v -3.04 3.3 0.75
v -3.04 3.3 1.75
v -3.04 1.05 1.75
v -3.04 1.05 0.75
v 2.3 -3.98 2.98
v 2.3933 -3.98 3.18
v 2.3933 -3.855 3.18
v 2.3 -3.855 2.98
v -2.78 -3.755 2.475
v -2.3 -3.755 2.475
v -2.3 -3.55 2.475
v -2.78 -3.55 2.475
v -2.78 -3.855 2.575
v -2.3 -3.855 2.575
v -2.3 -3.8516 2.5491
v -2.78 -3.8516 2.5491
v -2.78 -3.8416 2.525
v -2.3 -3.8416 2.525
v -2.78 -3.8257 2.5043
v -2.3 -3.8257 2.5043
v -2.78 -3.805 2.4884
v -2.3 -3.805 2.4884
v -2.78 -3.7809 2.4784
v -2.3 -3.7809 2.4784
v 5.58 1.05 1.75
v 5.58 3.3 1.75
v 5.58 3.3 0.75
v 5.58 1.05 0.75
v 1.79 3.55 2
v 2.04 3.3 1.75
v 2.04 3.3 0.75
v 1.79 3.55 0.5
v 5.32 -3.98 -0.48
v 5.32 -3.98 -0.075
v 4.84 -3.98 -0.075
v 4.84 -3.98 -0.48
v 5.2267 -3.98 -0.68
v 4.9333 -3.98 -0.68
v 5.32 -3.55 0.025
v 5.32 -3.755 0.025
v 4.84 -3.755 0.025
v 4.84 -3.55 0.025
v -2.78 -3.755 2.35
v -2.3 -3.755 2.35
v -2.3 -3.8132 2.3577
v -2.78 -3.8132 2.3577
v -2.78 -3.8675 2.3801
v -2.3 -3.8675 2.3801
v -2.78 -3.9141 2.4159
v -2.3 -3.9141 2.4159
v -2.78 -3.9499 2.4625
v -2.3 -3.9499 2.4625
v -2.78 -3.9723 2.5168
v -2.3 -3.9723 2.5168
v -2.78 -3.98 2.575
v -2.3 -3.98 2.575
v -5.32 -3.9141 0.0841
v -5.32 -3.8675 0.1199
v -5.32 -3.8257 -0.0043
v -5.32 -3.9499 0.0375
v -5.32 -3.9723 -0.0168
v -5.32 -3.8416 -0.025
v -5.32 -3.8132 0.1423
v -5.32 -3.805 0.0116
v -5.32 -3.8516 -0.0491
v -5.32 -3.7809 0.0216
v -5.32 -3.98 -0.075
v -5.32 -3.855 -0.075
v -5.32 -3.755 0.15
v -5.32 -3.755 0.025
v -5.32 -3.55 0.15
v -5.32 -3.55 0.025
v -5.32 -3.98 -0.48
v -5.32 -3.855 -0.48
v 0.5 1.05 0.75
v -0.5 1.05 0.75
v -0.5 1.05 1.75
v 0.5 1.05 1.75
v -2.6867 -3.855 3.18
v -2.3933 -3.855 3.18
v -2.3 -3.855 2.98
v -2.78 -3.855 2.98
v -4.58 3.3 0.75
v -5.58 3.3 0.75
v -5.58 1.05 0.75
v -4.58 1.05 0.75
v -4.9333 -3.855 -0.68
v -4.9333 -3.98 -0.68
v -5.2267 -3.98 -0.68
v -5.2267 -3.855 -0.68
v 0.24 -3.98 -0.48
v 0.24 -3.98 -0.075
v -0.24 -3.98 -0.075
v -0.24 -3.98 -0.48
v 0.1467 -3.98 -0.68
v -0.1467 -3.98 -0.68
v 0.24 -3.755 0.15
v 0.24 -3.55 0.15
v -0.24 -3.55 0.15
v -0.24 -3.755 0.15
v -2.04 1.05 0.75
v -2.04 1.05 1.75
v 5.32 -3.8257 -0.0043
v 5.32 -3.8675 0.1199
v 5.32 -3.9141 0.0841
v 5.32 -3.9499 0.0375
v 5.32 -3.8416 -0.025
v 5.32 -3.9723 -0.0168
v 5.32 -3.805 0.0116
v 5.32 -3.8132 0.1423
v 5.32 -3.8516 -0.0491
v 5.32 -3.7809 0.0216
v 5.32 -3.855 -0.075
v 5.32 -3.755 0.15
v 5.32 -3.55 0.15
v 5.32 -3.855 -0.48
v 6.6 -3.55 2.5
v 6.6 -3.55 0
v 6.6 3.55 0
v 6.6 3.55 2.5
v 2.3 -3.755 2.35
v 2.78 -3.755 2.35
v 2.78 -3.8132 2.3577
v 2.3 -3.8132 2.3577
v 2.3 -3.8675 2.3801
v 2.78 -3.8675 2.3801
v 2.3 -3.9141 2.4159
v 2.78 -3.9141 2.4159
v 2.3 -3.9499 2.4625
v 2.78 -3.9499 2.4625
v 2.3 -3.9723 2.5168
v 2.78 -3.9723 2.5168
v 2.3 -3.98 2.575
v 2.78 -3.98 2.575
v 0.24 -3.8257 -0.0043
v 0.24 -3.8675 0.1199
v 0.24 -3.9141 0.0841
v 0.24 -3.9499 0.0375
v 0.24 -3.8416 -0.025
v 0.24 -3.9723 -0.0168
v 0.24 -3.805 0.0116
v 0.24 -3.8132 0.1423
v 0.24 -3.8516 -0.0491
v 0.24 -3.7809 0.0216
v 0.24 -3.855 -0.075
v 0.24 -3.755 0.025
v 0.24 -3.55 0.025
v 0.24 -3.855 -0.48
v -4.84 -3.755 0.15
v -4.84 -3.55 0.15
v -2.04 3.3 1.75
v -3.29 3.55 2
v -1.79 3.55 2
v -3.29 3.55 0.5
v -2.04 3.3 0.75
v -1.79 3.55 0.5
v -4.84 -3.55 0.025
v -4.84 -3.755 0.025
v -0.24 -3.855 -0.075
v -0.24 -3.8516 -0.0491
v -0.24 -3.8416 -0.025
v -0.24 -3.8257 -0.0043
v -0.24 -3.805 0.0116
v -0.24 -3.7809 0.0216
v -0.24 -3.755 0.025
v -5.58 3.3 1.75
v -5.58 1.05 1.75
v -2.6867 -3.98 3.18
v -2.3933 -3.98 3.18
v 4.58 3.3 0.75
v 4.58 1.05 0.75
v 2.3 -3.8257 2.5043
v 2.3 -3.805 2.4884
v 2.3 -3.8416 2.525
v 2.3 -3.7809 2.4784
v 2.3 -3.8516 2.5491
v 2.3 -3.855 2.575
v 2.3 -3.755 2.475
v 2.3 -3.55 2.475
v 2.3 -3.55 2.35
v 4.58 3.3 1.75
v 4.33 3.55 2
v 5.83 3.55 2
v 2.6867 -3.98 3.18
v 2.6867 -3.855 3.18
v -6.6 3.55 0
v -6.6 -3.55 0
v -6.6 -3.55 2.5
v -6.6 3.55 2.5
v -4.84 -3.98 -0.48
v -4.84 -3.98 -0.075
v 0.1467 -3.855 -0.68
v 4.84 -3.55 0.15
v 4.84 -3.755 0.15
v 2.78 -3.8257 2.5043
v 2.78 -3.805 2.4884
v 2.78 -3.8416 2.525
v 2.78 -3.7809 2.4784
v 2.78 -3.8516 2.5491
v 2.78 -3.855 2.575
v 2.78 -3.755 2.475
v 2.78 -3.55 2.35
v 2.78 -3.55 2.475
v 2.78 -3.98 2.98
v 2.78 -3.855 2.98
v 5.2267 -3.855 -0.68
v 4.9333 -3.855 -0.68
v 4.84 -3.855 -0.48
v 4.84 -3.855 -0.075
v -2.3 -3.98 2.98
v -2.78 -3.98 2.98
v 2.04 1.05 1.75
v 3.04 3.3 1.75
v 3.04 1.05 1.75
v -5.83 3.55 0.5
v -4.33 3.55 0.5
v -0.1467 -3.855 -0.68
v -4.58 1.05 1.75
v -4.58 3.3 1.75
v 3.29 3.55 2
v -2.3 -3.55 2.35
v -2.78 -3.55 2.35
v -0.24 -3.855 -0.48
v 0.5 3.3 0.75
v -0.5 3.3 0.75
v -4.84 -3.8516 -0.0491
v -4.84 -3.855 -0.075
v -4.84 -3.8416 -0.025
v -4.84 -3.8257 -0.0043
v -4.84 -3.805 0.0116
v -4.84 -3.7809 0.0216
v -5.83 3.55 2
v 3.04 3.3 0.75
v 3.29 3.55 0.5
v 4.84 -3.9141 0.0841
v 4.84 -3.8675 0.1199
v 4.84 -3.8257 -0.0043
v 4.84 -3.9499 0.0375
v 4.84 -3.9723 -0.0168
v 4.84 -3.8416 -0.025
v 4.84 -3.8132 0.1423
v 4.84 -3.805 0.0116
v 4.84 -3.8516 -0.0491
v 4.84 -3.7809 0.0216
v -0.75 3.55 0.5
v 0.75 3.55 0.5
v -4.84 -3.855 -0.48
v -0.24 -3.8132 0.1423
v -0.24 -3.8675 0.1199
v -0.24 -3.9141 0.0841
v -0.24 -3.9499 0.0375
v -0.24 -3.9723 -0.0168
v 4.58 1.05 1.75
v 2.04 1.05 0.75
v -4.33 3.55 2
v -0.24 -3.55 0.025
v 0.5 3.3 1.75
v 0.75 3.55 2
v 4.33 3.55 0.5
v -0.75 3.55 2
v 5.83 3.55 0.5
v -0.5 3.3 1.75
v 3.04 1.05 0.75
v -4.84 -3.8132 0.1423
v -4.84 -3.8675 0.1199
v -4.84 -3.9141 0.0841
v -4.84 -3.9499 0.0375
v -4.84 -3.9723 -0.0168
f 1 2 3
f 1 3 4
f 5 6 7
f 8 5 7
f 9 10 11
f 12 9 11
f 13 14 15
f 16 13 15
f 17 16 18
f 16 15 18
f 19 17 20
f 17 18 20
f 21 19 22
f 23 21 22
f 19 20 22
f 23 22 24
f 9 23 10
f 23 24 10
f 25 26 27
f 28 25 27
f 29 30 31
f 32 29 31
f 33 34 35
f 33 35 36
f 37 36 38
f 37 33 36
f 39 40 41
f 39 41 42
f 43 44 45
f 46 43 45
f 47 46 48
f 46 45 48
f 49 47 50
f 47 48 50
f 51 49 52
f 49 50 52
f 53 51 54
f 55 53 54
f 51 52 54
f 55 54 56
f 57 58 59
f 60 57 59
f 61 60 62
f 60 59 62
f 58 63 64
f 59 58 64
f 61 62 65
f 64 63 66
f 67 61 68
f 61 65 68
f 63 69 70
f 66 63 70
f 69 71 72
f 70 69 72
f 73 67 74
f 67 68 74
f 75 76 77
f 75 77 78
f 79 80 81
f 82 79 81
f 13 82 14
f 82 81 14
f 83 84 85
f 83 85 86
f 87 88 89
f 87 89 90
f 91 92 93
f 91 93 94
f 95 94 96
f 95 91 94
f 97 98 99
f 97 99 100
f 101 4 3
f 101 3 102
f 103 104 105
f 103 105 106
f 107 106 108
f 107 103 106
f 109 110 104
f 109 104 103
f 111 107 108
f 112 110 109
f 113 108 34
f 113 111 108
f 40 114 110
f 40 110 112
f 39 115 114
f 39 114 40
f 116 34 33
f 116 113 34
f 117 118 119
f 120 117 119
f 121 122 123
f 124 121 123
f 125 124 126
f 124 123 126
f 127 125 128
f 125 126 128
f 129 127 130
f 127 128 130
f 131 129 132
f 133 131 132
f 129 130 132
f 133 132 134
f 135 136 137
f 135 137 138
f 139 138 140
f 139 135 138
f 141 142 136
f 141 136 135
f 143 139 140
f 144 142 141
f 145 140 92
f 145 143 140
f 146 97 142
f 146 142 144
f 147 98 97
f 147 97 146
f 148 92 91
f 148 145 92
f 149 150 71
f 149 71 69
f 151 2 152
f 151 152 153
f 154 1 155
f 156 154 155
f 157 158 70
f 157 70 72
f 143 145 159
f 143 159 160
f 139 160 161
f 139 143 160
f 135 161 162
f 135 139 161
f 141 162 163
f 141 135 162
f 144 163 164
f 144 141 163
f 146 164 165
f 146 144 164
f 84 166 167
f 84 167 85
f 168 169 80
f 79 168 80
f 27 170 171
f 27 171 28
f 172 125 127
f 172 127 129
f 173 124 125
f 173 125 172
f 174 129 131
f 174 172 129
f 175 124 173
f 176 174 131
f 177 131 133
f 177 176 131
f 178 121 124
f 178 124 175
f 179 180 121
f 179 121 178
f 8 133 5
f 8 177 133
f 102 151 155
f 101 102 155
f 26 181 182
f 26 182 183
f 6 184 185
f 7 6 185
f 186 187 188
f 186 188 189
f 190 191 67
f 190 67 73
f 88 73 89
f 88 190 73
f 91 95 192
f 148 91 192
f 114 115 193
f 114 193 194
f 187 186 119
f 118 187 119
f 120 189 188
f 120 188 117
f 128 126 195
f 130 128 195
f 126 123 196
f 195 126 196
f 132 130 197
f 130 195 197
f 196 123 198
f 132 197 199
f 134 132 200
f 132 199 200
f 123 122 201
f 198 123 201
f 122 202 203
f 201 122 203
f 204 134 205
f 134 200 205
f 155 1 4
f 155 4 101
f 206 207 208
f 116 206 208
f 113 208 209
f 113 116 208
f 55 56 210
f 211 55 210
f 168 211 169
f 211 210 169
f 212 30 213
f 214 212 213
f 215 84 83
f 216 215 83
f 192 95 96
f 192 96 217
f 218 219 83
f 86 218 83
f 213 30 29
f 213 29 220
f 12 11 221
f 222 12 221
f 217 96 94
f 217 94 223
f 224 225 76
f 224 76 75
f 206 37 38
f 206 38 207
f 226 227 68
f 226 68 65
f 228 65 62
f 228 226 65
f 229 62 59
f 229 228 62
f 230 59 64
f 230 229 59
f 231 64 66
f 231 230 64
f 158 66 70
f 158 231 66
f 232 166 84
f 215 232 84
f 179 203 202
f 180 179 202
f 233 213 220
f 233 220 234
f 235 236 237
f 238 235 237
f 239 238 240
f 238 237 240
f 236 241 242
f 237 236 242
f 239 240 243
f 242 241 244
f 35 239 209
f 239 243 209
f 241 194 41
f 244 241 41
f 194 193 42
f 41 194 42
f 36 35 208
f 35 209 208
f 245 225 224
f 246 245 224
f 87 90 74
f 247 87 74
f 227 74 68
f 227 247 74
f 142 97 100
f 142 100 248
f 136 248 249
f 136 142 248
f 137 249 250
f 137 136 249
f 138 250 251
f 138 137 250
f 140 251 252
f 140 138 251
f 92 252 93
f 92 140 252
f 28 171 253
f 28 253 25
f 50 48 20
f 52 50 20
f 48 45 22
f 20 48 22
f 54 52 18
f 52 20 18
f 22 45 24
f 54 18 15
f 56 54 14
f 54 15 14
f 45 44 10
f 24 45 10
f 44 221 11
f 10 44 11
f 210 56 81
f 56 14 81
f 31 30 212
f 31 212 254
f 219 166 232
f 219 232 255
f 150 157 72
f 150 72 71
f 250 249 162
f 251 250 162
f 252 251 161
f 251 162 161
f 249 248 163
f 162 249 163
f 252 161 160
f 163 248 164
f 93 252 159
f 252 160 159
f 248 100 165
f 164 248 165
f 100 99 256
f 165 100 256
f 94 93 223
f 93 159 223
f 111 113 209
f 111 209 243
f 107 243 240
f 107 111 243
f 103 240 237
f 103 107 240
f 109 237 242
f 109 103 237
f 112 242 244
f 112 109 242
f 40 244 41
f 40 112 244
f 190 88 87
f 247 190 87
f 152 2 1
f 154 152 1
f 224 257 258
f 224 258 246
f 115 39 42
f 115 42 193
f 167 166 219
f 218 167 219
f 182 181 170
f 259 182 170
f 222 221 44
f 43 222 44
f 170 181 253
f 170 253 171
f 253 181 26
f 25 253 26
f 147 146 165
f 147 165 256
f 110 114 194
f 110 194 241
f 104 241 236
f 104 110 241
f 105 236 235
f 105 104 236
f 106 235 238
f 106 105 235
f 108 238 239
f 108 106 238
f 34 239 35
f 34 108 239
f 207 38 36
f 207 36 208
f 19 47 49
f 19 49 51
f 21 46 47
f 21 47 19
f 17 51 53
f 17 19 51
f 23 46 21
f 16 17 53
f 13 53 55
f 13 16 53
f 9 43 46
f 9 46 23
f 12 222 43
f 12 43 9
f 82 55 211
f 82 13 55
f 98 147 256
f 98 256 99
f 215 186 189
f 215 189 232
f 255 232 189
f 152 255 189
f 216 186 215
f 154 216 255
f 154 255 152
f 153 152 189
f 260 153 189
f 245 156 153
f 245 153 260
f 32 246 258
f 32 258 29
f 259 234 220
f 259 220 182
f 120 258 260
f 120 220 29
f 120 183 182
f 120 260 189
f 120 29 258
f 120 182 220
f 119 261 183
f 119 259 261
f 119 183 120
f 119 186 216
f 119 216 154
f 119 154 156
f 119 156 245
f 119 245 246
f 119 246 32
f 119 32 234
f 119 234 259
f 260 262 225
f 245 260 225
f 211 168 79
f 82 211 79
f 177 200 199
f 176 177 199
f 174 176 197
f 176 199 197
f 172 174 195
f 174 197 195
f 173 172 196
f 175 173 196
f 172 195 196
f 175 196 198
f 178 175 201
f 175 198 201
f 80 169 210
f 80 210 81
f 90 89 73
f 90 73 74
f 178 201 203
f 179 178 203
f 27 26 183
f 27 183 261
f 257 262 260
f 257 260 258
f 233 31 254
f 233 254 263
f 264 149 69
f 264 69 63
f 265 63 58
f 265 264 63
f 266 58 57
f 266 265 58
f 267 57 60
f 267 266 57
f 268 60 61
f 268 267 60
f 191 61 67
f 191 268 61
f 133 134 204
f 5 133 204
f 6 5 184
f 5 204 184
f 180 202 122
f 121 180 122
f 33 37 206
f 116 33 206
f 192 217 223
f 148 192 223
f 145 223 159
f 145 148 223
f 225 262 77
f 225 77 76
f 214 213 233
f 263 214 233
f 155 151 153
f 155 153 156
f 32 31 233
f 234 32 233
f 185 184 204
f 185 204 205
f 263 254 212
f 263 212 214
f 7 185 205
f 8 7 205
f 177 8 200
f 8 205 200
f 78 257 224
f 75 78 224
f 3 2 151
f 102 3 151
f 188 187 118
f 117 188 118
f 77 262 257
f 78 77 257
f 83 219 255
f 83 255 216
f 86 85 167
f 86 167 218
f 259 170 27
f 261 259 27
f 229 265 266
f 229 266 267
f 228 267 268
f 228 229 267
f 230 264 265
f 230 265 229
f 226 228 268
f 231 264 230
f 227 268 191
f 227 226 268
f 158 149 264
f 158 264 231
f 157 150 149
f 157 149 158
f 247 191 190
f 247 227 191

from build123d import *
from OCP.BRepFilletAPI import BRepFilletAPI_MakeChamfer

# Parameters (mm, degrees)
SKETCH1_W                  = 13.2
SKETCH1_H                  = 7.1
BOSS_EXTRUDE1_DEPTH        = 2.5
SKETCH2_W                  = 1
SKETCH2_H                  = 1
CUT_EXTRUDE1_DEPTH         = 2.5
CHAMFER1_SIZE              = 0.25
LPATTERN6_COUNT            = 5
LPATTERN6_PITCH            = 2.54
CHAMFER1_OF_LPATTERN6_SIZE = 0.25
BASE_FLANGE2_DEPTH         = 0.24
BASE_FLANGE2_DEPTH_BACK    = 0.24
BASE_FLANGE3_DEPTH         = 0.24
BASE_FLANGE3_DEPTH_BACK    = 0.24
CHAMFER3_SIZE              = 0.2
CHAMFER3_SIZE2             = 0.093261532
CHAMFER4_SIZE              = 0.2
CHAMFER4_SIZE2             = 0.093261532
LPATTERN4_COUNT            = 3
LPATTERN4_PITCH            = 5.08
LPATTERN3_COUNT            = 2
LPATTERN3_PITCH            = 5.08


# Sheet-metal steps are written as plain solids
with BuildPart() as part:
    # Sketch1 → Boss-Extrude1 (new body)
    with BuildSketch(Plane.XY):
        Rectangle(SKETCH1_W, SKETCH1_H)
    extrude(amount=BOSS_EXTRUDE1_DEPTH)

    # Sketch2 → Cut-Extrude1 (cut)
    with BuildSketch(Plane(origin=(0, 3.55, 0), x_dir=(1, 0, 0), z_dir=(0, 1, 0))):
        with Locations((-5.08, -1.25)):
            Rectangle(SKETCH2_W, SKETCH2_H)
    cut_extrude1 = extrude(amount=-CUT_EXTRUDE1_DEPTH, mode=Mode.SUBTRACT)

    # Chamfer1
    chamfer1_edges = [part.edges().sort_by_distance(p)[0] for p in [
        (-4.58, 3.55, 1.25),
        (-5.08, 3.55, 0.75),
        (-5.58, 3.55, 1.25),
        (-5.08, 3.55, 1.75),
    ]]
    chamfer(chamfer1_edges, length=CHAMFER1_SIZE)

    # LPattern6: Cut-Extrude1 ×5
    with Locations(*[(i * LPATTERN6_PITCH, 0, 0) for i in range(1, LPATTERN6_COUNT)]):
        add(cut_extrude1, mode=Mode.SUBTRACT)

    # Chamfer1 of LPattern6
    chamfer1_of_lpattern6_edges = [part.edges().sort_by_distance(p)[0] for p in [
        (-2.04, 3.55, 1.25),
        (-2.54, 3.55, 0.75),
        (-3.04, 3.55, 1.25),
        (-2.54, 3.55, 1.75),
        (0.5, 3.55, 1.25),
        (0, 3.55, 0.75),
        (-0.5, 3.55, 1.25),
        (0, 3.55, 1.75),
        (3.04, 3.55, 1.25),
        (2.54, 3.55, 0.75),
        (2.04, 3.55, 1.25),
        (2.54, 3.55, 1.75),
        (5.58, 3.55, 1.25),
        (5.08, 3.55, 0.75),
        (4.58, 3.55, 1.25),
        (5.08, 3.55, 1.75),
    ]]
    chamfer(chamfer1_of_lpattern6_edges, length=CHAMFER1_OF_LPATTERN6_SIZE)


with BuildPart() as body_2:
    # Sketch5 → Base-Flange2 (new, two sides: drawn at the far end of the back side and taken through both)
    with BuildSketch(Plane.ZY.offset(5.08).offset(-BASE_FLANGE2_DEPTH_BACK)):
        with BuildLine():
            Line((0.15, -3.55), (0.15, -3.755))
            ThreePointArc((0.15, -3.755), (0.084099026, -3.914099026), (-0.075, -3.98))
            Line((-0.075, -3.98), (-0.68, -3.98))
            Line((-0.68, -3.98), (-0.68, -3.855))
            Line((-0.68, -3.855), (-0.075, -3.855))
            ThreePointArc((-0.075, -3.855), (-0.004289322, -3.825710678), (0.025, -3.755))
            Line((0.025, -3.755), (0.025, -3.55))
            Line((0.025, -3.55), (0.15, -3.55))
        make_face()
    extrude(amount=BASE_FLANGE2_DEPTH + BASE_FLANGE2_DEPTH_BACK)

    # Chamfer4: one chamfer whose edges measure the first distance from different faces: ONE call of the kernel's chamfer builder (chamfer() names one face for all edges)
    chamfer4_edges_1 = [body_2.edges().sort_by_distance(p)[0] for p in [
        (-4.84, -3.9175, -0.68),
    ]]
    chamfer4_side_1 = [body_2.faces().sort_by_distance(p)[0] for p in [
        (-4.84, -3.6525, 0.034347727),
    ]]
    chamfer4_edges_2 = [body_2.edges().sort_by_distance(p)[0] for p in [
        (-5.32, -3.9175, -0.68),
    ]]
    chamfer4_side_2 = [body_2.faces().sort_by_distance(p)[0] for p in [
        (-5.32, -3.6525, 0.034347727),
    ]]
    chamfer4 = BRepFilletAPI_MakeChamfer(body_2.part.solid().wrapped)
    for e in chamfer4_edges_1:
        chamfer4.Add(CHAMFER4_SIZE, CHAMFER4_SIZE2, e.wrapped, chamfer4_side_1[0].wrapped)  # the first distance lies on this face
    for e in chamfer4_edges_2:
        chamfer4.Add(CHAMFER4_SIZE, CHAMFER4_SIZE2, e.wrapped, chamfer4_side_2[0].wrapped)  # the first distance lies on this face
    add(Compound.cast(chamfer4.Shape()), mode=Mode.REPLACE)


with BuildPart() as body_3:
    # Sketch22 → Base-Flange3 (new, two sides: drawn at the far end of the back side and taken through both)
    with BuildSketch(Plane.ZY.offset(2.54).offset(-BASE_FLANGE3_DEPTH_BACK)):
        with BuildLine():
            Line((2.35, -3.55), (2.35, -3.755))
            ThreePointArc((2.35, -3.755), (2.415900974, -3.914099026), (2.575, -3.98))
            Line((2.575, -3.98), (3.18, -3.98))
            Line((3.18, -3.98), (3.18, -3.855))
            Line((3.18, -3.855), (2.575, -3.855))
            ThreePointArc((2.575, -3.855), (2.504289322, -3.825710678), (2.475, -3.755))
            Line((2.475, -3.755), (2.475, -3.55))
            Line((2.475, -3.55), (2.35, -3.55))
        make_face()
    extrude(amount=BASE_FLANGE3_DEPTH + BASE_FLANGE3_DEPTH_BACK)

    # Chamfer3: one chamfer whose edges measure the first distance from different faces: ONE call of the kernel's chamfer builder (chamfer() names one face for all edges)
    chamfer3_edges_1 = [body_3.edges().sort_by_distance(p)[0] for p in [
        (-2.3, -3.9175, 3.18),
    ]]
    chamfer3_side_1 = [body_3.faces().sort_by_distance(p)[0] for p in [
        (-2.3, -3.6525, 2.465652273),
    ]]
    chamfer3_edges_2 = [body_3.edges().sort_by_distance(p)[0] for p in [
        (-2.78, -3.9175, 3.18),
    ]]
    chamfer3_side_2 = [body_3.faces().sort_by_distance(p)[0] for p in [
        (-2.78, -3.6525, 2.465652273),
    ]]
    chamfer3 = BRepFilletAPI_MakeChamfer(body_3.part.solid().wrapped)
    for e in chamfer3_edges_1:
        chamfer3.Add(CHAMFER3_SIZE, CHAMFER3_SIZE2, e.wrapped, chamfer3_side_1[0].wrapped)  # the first distance lies on this face
    for e in chamfer3_edges_2:
        chamfer3.Add(CHAMFER3_SIZE, CHAMFER3_SIZE2, e.wrapped, chamfer3_side_2[0].wrapped)  # the first distance lies on this face
    add(Compound.cast(chamfer3.Shape()), mode=Mode.REPLACE)


with BuildPart() as lpattern4_1:
    # LPattern4: pattern copy
    add(body_2.part.moved(Location(Vector(1, 0, 0) * (1 * LPATTERN4_PITCH))))


with BuildPart() as lpattern4_2:
    # LPattern4: pattern copy
    add(body_2.part.moved(Location(Vector(1, 0, 0) * (2 * LPATTERN4_PITCH))))


with BuildPart() as lpattern3_1:
    # LPattern3: pattern copy
    add(body_3.part.moved(Location(Vector(1, 0, 0) * (1 * LPATTERN3_PITCH))))


solid = Compound([part.part, body_2.part, body_3.part, lpattern4_1.part, lpattern4_2.part, lpattern3_1.part])
